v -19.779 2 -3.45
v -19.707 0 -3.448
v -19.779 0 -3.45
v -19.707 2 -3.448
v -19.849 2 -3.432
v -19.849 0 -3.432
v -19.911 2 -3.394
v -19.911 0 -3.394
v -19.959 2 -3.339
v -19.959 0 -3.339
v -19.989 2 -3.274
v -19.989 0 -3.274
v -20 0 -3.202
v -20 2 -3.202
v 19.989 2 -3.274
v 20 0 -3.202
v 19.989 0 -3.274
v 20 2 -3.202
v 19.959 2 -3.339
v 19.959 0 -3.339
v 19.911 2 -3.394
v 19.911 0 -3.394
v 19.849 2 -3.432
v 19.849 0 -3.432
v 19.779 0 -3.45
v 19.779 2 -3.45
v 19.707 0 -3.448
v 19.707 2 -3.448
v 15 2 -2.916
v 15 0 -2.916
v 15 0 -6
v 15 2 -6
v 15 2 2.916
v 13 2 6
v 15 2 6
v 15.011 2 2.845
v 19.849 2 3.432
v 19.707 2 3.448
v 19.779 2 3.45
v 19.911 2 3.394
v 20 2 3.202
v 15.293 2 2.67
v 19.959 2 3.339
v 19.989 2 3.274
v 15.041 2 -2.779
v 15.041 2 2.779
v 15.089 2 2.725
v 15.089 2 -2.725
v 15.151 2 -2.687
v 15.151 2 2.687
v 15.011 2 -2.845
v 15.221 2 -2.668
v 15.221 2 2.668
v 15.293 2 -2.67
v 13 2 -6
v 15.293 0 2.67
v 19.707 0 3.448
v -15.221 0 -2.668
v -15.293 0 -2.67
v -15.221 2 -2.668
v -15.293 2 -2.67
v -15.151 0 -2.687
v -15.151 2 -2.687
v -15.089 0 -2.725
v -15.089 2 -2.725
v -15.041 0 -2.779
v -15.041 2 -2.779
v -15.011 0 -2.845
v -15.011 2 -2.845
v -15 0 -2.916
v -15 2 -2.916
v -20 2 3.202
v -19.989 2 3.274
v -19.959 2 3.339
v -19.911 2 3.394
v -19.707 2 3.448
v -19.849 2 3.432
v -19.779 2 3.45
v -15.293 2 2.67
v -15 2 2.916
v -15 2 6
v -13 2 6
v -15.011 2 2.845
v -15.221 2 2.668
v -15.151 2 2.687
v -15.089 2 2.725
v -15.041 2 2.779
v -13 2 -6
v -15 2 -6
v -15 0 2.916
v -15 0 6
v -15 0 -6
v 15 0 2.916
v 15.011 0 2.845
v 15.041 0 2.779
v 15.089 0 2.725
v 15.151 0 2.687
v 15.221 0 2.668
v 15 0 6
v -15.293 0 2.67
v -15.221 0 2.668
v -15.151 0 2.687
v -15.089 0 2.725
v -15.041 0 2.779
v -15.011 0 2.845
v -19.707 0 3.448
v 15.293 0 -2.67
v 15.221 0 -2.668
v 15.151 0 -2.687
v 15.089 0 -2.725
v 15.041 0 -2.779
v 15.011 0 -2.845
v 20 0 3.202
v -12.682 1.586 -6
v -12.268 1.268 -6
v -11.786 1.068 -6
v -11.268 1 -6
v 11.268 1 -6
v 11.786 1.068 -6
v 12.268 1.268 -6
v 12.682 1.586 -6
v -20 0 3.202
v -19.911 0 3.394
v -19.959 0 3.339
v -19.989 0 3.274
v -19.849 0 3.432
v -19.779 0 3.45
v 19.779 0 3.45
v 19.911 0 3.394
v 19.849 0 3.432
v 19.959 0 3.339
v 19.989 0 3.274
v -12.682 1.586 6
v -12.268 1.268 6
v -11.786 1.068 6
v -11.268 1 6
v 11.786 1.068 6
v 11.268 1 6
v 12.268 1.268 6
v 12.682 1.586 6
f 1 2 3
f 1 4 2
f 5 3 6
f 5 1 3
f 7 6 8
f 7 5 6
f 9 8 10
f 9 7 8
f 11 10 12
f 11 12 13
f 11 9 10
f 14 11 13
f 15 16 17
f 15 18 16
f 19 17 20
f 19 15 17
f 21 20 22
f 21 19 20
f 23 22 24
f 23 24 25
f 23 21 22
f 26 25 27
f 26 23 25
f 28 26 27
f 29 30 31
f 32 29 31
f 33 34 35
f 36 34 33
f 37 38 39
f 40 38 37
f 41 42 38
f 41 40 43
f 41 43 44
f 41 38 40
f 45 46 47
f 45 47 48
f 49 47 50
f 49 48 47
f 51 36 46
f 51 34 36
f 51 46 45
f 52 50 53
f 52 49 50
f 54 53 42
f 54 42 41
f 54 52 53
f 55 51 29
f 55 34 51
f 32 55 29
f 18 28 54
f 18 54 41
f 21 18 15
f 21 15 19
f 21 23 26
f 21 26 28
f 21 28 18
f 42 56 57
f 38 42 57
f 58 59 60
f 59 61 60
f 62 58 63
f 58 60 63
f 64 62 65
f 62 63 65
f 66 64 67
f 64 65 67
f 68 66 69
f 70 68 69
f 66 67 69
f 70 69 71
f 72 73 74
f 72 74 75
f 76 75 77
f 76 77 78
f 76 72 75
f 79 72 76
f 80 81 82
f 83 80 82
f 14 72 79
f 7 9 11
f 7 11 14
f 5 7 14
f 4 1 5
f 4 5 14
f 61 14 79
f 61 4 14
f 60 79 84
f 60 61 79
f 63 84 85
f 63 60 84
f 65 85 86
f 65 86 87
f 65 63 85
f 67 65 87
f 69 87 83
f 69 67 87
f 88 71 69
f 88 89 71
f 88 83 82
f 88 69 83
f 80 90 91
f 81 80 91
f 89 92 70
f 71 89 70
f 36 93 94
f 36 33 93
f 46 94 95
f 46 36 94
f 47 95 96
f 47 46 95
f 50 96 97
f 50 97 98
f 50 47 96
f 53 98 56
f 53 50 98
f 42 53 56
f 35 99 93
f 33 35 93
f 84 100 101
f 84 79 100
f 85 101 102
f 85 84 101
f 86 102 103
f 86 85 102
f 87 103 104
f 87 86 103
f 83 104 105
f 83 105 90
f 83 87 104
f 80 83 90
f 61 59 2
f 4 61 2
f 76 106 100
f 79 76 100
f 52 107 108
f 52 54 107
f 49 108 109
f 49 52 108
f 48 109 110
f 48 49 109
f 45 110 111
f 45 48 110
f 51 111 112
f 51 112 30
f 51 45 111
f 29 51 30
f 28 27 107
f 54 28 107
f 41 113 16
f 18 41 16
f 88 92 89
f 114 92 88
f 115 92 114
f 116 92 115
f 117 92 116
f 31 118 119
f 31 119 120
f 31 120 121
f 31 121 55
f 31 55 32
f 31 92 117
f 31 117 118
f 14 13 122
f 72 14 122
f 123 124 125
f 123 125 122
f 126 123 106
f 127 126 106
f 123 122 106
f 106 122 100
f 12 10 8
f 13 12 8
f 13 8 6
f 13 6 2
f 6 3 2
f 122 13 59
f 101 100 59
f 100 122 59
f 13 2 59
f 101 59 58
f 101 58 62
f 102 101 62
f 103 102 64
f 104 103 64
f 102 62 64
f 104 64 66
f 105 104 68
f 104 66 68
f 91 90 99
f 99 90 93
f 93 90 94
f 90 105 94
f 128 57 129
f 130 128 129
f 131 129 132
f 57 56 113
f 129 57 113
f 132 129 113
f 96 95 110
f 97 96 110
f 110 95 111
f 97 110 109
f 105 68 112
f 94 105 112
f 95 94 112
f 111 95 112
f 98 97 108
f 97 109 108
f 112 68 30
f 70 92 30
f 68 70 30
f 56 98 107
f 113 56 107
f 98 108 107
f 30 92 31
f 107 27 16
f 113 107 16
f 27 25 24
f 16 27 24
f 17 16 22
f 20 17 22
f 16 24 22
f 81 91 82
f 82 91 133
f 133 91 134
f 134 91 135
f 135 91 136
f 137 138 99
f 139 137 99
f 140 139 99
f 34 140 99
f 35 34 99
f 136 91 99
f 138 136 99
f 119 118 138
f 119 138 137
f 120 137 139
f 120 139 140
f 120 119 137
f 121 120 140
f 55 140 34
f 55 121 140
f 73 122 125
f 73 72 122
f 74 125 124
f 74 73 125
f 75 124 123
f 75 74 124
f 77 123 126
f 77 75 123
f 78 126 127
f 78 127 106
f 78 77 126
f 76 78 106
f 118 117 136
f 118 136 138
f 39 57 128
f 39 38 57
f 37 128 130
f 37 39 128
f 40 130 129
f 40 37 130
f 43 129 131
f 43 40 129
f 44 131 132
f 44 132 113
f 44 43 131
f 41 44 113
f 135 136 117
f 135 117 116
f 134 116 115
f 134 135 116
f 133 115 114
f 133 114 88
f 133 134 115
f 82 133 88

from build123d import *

# Parameters (mm, degrees)
BOSS_EXTRUDE1_DEPTH = 2
FILLET1_R           = 0.25
SKETCH3_W           = 26
SKETCH3_H           = 12
CUT_EXTRUDE2_DEPTH  = 1
FILLET6_R           = 2


with BuildPart() as part:
    # Sketch1 → Boss-Extrude1 (new body)
    with BuildSketch(Plane(origin=(0, 0, 0), x_dir=(1, 0, 0), z_dir=(0, 1, 0))):
        Polygon((-15, 2.618365096), (-20, 3.5), (-20, -3.5), (-15, -2.618365096), (-15, -6), (15, -6), (15, -2.618365096), (20, -3.5), (20, 3.5), (15, 2.618365096), (15, 6), (-15, 6), align=None)
    extrude(amount=BOSS_EXTRUDE1_DEPTH)

    # Fillet1
    fillet1_edges = [part.edges().sort_by_distance(p)[0] for p in [
        (15, 1, -2.618365096),
        (20, 1, -3.5),
        (20, 1, 3.5),
        (15, 1, 2.618365096),
        (-15, 1, 2.618365096),
        (-20, 1, 3.5),
        (-20, 1, -3.5),
        (-15, 1, -2.618365096),
    ]]
    fillet(fillet1_edges, radius=FILLET1_R)

    # Sketch3 → Cut-Extrude2 (cut)
    with BuildSketch(Plane(origin=(0, 2, 0), x_dir=(1, 0, 0), z_dir=(0, 1, 0))):
        Rectangle(SKETCH3_W, SKETCH3_H)
    extrude(amount=-CUT_EXTRUDE2_DEPTH, mode=Mode.SUBTRACT)

    # Fillet6
    # the kernel refuses this fillet: 2 mm, written as the material it adds along each edge
    with BuildSketch(Plane(origin=(-13, 1, 6), x_dir=(0, 1, 0), z_dir=(0, 0, -1))) as fillet6_piece_1:
        with BuildLine():
            CenterArc((2, 1.732050808), FILLET6_R, 180, 60)
            Line((0, 1.732050808), (-0.04, 1.732050808))
            Line((-0.04, 1.732050808), (-0.04, 0))
            Line((-0.04, 0), (0, -0.04))
            ThreePointArc((0, -0.04), (0.5, -0.04), (0.98, -0.034641016))
            Line((0.98, -0.034641016), (1, 0))
        make_face()
    extrude(amount=12)
    with BuildSketch(Plane(origin=(13, 1, -6), x_dir=(-1, 0, 0), z_dir=(0, 0, 1))) as fillet6_piece_2:
        with BuildLine():
            CenterArc((1.732050808, -2), FILLET6_R, 90, 60)
            Line((0, -1), (-0.034641016, -0.98))
            ThreePointArc((-0.034641016, -0.98), (-0.04, -0.5), (-0.04, 0))
            Line((-0.04, 0), (0, 0.04))
            Line((0, 0.04), (1.732050808, 0.04))
            Line((1.732050808, 0.04), (1.732050808, 0))
        make_face()
    extrude(amount=12)


solid = part.part
